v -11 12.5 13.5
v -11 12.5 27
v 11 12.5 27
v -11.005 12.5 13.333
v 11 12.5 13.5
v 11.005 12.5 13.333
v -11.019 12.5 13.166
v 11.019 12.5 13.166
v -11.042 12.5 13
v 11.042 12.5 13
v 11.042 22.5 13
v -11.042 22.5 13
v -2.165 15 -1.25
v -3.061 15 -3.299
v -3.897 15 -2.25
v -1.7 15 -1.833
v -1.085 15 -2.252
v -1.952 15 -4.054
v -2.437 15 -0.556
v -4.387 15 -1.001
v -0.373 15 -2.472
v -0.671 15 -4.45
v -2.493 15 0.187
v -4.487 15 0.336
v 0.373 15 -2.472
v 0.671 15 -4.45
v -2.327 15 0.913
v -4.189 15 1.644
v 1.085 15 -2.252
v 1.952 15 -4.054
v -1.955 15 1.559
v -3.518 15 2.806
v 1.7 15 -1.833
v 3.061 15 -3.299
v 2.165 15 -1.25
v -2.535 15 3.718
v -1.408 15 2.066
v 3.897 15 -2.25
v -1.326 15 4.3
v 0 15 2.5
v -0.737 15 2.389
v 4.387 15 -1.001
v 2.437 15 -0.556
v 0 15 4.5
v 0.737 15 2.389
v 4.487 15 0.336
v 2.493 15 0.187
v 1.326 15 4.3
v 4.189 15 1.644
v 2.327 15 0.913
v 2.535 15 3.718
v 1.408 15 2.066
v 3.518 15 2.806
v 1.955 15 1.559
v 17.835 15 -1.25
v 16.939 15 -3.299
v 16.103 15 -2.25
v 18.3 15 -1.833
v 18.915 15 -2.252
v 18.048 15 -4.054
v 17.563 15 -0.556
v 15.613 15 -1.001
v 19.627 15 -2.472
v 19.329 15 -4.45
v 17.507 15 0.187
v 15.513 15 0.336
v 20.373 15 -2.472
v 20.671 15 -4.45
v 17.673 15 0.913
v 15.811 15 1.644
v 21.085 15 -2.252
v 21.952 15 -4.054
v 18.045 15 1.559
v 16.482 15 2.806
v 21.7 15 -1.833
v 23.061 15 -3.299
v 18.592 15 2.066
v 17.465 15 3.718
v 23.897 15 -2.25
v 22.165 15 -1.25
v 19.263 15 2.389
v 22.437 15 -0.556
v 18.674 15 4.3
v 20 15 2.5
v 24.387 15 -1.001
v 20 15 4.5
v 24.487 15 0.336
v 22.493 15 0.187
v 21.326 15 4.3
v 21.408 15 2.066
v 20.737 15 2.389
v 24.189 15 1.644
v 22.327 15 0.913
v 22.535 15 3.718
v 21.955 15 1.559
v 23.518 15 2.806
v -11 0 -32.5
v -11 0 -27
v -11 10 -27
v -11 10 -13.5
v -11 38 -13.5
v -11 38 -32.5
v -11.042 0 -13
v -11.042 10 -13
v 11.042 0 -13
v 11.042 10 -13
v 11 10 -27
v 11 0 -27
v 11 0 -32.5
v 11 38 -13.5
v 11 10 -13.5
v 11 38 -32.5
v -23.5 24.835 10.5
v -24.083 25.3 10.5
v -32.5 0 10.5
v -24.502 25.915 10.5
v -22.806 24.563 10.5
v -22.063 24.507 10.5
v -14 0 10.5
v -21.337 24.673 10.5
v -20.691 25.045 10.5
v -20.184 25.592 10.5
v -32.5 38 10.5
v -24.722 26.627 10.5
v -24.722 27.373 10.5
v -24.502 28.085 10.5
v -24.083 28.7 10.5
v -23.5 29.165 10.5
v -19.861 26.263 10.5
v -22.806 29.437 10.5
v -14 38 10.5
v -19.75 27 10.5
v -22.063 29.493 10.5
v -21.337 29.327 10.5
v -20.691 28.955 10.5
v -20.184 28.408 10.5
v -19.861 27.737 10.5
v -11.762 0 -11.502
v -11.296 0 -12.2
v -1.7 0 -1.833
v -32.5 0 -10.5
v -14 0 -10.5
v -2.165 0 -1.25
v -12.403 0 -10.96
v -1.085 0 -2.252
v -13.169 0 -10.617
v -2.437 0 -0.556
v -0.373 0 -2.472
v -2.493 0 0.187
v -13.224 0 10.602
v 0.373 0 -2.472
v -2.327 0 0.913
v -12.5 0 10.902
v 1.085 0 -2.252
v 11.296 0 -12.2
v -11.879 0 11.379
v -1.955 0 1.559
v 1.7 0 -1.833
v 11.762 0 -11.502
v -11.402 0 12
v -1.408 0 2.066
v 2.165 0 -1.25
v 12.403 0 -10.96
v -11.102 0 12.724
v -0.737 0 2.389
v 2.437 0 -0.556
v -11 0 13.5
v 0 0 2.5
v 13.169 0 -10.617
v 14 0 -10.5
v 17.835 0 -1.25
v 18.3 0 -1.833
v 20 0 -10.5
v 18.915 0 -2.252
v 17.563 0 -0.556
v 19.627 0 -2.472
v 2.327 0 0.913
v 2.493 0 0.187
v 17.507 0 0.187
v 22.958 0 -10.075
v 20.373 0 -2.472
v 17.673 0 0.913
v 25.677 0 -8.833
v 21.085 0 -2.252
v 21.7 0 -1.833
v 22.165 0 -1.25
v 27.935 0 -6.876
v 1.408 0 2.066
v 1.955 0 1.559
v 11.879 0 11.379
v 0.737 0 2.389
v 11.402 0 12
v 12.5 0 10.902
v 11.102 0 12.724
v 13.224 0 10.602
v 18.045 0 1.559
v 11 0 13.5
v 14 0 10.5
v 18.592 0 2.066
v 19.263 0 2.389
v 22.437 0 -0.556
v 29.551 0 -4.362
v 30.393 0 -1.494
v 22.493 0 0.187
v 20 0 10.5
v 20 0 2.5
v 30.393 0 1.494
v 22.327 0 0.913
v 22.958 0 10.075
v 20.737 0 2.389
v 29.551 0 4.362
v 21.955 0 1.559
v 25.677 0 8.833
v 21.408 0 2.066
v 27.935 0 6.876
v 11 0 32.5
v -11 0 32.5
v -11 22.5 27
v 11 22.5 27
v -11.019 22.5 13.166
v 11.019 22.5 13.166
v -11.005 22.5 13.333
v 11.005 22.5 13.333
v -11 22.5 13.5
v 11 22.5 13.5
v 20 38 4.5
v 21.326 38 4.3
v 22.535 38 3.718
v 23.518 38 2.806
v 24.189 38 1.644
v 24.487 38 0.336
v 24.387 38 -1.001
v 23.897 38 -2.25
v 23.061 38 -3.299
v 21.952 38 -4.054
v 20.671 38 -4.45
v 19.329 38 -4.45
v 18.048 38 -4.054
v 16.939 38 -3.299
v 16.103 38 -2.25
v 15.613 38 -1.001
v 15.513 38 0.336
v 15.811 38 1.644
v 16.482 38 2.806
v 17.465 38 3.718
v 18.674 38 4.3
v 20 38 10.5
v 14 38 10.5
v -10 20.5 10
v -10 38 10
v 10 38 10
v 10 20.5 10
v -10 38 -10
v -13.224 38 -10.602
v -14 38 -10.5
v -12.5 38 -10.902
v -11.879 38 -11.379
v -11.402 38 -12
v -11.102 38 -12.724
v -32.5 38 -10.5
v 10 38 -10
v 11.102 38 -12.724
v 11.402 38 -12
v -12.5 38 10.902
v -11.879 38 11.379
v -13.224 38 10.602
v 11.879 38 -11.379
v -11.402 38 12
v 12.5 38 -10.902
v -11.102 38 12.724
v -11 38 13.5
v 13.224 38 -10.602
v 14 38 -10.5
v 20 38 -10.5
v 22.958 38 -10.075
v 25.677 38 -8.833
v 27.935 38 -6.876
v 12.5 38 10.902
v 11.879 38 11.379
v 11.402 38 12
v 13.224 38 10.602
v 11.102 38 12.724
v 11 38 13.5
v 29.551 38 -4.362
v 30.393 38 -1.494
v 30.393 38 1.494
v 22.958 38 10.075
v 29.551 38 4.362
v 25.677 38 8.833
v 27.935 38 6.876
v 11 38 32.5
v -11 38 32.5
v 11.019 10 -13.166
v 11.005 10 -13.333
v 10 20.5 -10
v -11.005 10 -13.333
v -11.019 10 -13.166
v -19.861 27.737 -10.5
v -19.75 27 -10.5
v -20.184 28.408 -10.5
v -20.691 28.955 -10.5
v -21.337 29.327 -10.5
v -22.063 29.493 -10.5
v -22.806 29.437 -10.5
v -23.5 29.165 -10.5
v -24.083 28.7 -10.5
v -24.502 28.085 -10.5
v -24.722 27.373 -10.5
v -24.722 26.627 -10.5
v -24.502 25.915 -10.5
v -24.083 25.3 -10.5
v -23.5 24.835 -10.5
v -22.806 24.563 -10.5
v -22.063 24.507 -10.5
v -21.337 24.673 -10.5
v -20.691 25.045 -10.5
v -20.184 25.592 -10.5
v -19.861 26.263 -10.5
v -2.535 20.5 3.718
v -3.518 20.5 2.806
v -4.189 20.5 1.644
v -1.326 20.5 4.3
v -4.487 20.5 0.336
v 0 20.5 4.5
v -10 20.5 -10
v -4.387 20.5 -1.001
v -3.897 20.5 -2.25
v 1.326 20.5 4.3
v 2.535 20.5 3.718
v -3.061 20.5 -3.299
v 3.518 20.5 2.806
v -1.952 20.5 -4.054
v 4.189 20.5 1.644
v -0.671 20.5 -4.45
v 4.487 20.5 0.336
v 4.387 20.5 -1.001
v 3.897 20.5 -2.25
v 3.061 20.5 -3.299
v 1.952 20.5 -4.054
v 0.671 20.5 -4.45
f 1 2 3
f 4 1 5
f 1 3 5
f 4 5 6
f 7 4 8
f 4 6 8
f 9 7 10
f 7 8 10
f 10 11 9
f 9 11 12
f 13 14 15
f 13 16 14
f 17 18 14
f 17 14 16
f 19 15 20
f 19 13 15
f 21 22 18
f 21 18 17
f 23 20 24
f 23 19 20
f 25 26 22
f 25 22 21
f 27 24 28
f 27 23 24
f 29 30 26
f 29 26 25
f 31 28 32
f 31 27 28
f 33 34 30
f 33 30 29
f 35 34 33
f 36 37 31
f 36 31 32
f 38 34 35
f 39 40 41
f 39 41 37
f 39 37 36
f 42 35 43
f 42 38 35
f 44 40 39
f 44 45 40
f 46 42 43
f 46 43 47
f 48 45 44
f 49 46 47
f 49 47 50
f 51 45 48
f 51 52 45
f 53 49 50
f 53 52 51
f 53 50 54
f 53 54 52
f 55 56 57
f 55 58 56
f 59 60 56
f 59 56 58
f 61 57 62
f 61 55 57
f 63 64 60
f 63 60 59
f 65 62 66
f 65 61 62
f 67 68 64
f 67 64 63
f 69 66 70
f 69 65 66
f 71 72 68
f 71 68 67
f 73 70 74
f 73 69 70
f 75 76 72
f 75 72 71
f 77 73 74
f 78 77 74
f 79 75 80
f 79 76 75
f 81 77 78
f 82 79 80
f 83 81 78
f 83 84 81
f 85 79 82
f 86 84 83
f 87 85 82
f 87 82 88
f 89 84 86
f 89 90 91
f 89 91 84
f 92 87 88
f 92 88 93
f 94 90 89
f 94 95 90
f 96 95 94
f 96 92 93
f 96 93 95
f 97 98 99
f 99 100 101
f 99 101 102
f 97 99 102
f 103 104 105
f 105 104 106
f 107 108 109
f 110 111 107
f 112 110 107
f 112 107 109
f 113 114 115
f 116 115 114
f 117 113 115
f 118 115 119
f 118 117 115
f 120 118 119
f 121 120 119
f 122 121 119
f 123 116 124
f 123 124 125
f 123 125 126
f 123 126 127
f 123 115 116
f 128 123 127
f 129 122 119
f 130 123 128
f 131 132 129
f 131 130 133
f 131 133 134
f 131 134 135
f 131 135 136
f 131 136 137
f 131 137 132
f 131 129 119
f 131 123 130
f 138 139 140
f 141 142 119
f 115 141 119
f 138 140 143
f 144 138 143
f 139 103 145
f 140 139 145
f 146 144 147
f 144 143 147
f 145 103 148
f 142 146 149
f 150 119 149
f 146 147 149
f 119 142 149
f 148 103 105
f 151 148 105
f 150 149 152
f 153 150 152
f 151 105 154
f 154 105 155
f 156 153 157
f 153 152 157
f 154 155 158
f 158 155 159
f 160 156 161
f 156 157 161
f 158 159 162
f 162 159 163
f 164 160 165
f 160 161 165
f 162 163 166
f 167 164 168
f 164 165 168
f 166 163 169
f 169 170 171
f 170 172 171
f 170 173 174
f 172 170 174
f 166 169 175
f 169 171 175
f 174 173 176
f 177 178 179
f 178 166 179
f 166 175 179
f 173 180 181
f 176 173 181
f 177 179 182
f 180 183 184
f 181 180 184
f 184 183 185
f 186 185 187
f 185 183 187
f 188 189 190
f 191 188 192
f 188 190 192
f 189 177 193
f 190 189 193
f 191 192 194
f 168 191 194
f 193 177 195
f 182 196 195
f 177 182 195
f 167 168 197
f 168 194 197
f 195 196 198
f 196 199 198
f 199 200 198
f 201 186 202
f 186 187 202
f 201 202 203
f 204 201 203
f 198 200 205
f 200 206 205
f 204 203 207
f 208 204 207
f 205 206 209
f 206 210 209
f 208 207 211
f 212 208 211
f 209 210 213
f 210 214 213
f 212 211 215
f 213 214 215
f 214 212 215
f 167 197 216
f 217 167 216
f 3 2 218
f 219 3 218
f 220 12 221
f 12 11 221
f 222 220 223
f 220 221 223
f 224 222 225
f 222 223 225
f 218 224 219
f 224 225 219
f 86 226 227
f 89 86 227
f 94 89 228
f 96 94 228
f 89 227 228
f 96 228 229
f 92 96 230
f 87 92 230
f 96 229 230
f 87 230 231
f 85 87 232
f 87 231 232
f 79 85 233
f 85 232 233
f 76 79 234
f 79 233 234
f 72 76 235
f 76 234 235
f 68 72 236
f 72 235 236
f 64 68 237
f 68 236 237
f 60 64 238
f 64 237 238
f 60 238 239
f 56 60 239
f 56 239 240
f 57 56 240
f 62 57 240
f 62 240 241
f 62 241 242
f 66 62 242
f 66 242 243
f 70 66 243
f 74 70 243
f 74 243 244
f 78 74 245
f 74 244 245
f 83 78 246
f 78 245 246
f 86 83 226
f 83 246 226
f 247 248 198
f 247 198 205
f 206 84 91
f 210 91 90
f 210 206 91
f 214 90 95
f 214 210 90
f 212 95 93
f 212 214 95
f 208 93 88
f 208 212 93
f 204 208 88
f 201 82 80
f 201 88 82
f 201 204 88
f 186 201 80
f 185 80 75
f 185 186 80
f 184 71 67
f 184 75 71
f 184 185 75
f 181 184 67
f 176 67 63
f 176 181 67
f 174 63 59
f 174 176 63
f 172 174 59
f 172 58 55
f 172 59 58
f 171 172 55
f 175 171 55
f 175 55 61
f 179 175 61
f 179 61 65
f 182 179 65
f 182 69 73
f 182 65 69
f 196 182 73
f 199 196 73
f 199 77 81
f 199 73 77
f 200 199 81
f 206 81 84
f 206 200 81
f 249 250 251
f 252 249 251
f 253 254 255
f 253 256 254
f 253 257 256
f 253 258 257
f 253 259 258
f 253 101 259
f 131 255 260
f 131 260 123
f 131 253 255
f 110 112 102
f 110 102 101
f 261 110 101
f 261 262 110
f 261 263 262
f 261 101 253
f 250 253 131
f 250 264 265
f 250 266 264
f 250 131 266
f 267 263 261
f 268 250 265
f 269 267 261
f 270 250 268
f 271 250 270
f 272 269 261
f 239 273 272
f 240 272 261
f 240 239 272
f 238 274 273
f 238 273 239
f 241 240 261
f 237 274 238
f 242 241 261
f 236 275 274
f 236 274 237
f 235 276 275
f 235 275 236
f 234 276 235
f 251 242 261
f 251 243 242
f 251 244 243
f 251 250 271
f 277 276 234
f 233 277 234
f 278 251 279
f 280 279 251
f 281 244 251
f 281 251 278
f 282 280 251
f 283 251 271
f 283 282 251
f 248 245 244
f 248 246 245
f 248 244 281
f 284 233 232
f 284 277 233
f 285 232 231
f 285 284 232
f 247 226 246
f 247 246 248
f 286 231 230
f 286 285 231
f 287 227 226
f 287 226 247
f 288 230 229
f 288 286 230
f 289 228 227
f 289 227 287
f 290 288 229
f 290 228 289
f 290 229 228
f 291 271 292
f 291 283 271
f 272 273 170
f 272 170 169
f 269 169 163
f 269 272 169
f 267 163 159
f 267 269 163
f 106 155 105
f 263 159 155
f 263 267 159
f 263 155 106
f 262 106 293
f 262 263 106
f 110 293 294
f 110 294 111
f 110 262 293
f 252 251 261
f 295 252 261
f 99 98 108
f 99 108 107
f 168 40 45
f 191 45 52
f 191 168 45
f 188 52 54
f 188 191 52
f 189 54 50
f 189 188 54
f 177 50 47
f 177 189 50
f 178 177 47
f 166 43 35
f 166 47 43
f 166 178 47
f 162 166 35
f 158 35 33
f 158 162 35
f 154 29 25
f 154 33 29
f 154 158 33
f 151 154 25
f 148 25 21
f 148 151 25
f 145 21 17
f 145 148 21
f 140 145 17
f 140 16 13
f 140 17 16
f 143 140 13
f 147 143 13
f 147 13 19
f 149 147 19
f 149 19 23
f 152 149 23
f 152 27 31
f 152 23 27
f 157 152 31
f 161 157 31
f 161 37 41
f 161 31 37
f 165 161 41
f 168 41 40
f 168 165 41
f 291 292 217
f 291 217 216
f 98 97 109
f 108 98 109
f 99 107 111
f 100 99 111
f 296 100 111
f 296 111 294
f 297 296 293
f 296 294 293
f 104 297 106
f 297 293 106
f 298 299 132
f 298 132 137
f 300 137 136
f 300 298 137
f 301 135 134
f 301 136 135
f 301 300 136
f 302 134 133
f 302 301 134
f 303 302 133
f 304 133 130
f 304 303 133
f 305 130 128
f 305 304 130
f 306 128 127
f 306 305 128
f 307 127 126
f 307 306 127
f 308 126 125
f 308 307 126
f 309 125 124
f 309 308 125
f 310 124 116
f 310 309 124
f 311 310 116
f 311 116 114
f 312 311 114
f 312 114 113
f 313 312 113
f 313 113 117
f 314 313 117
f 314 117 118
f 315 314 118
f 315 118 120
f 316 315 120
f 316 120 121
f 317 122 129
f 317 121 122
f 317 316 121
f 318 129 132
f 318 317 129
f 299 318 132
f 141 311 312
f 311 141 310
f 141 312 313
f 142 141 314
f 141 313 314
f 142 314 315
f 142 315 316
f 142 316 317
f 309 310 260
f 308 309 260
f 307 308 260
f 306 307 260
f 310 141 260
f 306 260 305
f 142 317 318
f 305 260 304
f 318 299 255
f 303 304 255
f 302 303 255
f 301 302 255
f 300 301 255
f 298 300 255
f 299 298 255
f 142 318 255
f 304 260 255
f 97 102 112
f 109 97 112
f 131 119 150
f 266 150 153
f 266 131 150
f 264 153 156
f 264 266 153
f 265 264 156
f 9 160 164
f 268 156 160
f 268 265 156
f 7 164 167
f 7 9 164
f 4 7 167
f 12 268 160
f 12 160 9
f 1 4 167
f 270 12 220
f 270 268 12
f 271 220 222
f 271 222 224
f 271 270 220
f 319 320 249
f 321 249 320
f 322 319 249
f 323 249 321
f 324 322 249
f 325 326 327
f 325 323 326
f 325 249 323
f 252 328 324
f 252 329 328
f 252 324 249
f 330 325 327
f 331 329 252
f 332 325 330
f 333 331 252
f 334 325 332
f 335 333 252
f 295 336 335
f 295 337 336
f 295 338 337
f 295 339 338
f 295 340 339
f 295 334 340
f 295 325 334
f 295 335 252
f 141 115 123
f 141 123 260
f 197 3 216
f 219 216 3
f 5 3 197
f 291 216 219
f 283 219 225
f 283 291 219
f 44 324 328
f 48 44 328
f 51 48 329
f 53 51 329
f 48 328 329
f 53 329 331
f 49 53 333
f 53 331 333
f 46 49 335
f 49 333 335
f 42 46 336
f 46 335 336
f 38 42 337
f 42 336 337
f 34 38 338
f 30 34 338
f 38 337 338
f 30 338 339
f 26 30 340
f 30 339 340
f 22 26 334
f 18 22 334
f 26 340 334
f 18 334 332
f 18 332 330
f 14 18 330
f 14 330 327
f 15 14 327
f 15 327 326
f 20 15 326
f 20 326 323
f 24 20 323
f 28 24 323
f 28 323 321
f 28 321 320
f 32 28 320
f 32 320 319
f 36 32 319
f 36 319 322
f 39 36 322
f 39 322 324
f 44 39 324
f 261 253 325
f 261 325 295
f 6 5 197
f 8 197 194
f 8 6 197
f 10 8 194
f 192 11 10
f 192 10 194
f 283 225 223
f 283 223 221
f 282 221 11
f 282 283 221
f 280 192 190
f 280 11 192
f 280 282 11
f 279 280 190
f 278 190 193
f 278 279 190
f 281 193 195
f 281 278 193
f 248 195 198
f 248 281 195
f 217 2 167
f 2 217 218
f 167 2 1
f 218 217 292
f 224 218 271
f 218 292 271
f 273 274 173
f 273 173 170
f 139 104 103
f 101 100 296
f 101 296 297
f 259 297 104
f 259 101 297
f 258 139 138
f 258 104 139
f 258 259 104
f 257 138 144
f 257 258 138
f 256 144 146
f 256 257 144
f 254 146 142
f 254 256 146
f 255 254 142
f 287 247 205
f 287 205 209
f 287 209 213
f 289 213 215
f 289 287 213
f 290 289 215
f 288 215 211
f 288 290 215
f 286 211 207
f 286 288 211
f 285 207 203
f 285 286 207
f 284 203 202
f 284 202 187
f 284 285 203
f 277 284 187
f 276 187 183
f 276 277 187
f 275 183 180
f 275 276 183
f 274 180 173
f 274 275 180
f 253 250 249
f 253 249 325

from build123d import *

# Parameters (mm, degrees)
SKETCH1_W               = 65
SKETCH1_H               = 65
SKETCH1_R               = 2.5
BOSS_EXTRUDE1_DEPTH     = 38
SKETCH3_W               = 21.5
SKETCH3_H               = 22
CUT_EXTRUDE2_DEPTH      = 60.636398282
CUT_EXTRUDE3_DEPTH      = 60.636398282
CUT_EXTRUDE3_DEPTH_BACK = 60.636398282
SKETCH4_R               = 2.5
CUT_EXTRUDE4_DEPTH      = 60.636398282
CUT_EXTRUDE4_DEPTH_BACK = 60.636398282
SKETCH6_W               = 14
SKETCH6_H               = 10
SKETCH7_W               = 20
SKETCH7_H               = 20
CUT_EXTRUDE5_DEPTH      = 17.5
FILLET1_R               = 3
SKETCH8_R               = 4.5
CUT_EXTRUDE6_DEPTH      = 23


with BuildPart() as part:
    # Sketch1 → Boss-Extrude1 (new body)
    with BuildSketch(Plane(origin=(0, 0, 0), x_dir=(1, 0, 0), z_dir=(0, 1, 0))):
        Rectangle(SKETCH1_W, SKETCH1_H)
        with Locations(Location((0, 0, 0), (0, 0, 270))):
            Circle(SKETCH1_R, mode=Mode.SUBTRACT)
        with Locations(Location((20, 0, 0), (0, 0, 270))):
            Circle(SKETCH1_R, mode=Mode.SUBTRACT)
    extrude(amount=BOSS_EXTRUDE1_DEPTH)

    # Sketch3 → Cut-Extrude2 (cut, through all)
    with BuildSketch(Plane(origin=(0, 38, 0), x_dir=(1, 0, 0), z_dir=(0, 1, 0))):
        with Locations((-21.75, 21.5)):
            Rectangle(SKETCH3_W, SKETCH3_H)
        with BuildLine():
            Line((11, 32.5), (32.5, 32.5))
            Line((32.5, 32.5), (32.5, -32.5))
            Line((32.5, -32.5), (11, -32.5))
            Line((11, -32.5), (11, -10.5))
            Line((11, -10.5), (20, -10.5))
            ThreePointArc((20, -10.5), (30.5, 0), (20, 10.5))
            Line((20, 10.5), (11, 10.5))
            Line((11, 10.5), (11, 32.5))
        make_face()
        with Locations((-21.75, -21.5)):
            Rectangle(SKETCH3_W, SKETCH3_H)
    extrude(amount=-CUT_EXTRUDE2_DEPTH, mode=Mode.SUBTRACT)

    # Sketch4 → Cut-Extrude3 (cut, two sides: drawn at the far end of the back side and taken through both)
    with BuildSketch(Plane.XY.offset(-CUT_EXTRUDE3_DEPTH_BACK)):
        with Locations((-22.25, 27)):
            Circle(SKETCH4_R)
    extrude(amount=CUT_EXTRUDE3_DEPTH + CUT_EXTRUDE3_DEPTH_BACK, mode=Mode.SUBTRACT)

    # Sketch6 → Cut-Extrude4 (cut, two sides: drawn at the far end of the back side and taken through both)
    with BuildSketch(Plane(origin=(0, 0, 0), x_dir=(0, 0, -1), z_dir=(1, 0, 0)).offset(-CUT_EXTRUDE4_DEPTH_BACK)):
        with Locations((-20, 17.5)):
            Rectangle(SKETCH6_W, SKETCH6_H)
        with Locations((20, 5)):
            Rectangle(SKETCH6_W, SKETCH6_H)
    extrude(amount=CUT_EXTRUDE4_DEPTH + CUT_EXTRUDE4_DEPTH_BACK, mode=Mode.SUBTRACT)

    # Sketch7 → Cut-Extrude5 (cut)
    with BuildSketch(Plane(origin=(0, 38, 0), x_dir=(1, 0, 0), z_dir=(0, 1, 0))):
        Rectangle(SKETCH7_W, SKETCH7_H)
    extrude(amount=-CUT_EXTRUDE5_DEPTH, mode=Mode.SUBTRACT)

    # Fillet1
    # the kernel refuses this fillet: 3 mm, written as the material it adds along each edge
    with BuildSketch(Plane(origin=(11, 38, -10.5), x_dir=(0, 0, -1), z_dir=(0, -1, 0))) as fillet1_piece_1_section:
        with BuildLine():
            CenterArc((FILLET1_R, FILLET1_R), FILLET1_R, 180, 90)
            Line((0, FILLET1_R), (0, 0))
            Line((0, 0), (FILLET1_R, 0))
        make_face()
    fillet1_piece_1 = extrude(amount=38, mode=Mode.PRIVATE)
    fillet1_piece_1 = split(fillet1_piece_1, bisect_by=Plane(origin=(10.978029732, 10, -13.226390424), z_dir=(0, 1, 0)), keep=Keep.TOP, mode=Mode.PRIVATE)
    fillet1_piece_1 = split(fillet1_piece_1, bisect_by=Plane(origin=(10.978029732, 24, -13), z_dir=(0, 0, -1)), keep=Keep.TOP, mode=Mode.PRIVATE)
    add(fillet1_piece_1)
    with BuildSketch(Plane(origin=(11, 38, -10.5), x_dir=(0, 0, -1), z_dir=(0, -1, 0))) as fillet1_piece_2_section:
        with BuildLine():
            CenterArc((FILLET1_R, FILLET1_R), FILLET1_R, 180, 90)
            Line((0, FILLET1_R), (0, 0))
            Line((0, 0), (FILLET1_R, 0))
        make_face()
    fillet1_piece_2 = extrude(amount=38, mode=Mode.PRIVATE)
    fillet1_piece_2 = split(fillet1_piece_2, bisect_by=Plane(origin=(11.690666213, 10, -11.145663974), z_dir=(0, 1, 0)), keep=Keep.TOP, mode=Mode.PRIVATE)
    fillet1_piece_2 = split(fillet1_piece_2, bisect_by=Plane(origin=(11.690666213, 24, -13), z_dir=(0, 0, 1)), keep=Keep.TOP, mode=Mode.PRIVATE)
    add(fillet1_piece_2)
    with BuildSketch(Plane(origin=(11, 38, -10.5), x_dir=(0, 0, -1), z_dir=(0, -1, 0))) as fillet1_piece_3_section:
        with BuildLine():
            CenterArc((FILLET1_R, FILLET1_R), FILLET1_R, 180, 90)
            Line((0, FILLET1_R), (0, 0))
            Line((0, 0), (FILLET1_R, 0))
        make_face()
    fillet1_piece_3 = extrude(amount=38, mode=Mode.PRIVATE)
    fillet1_piece_3 = split(fillet1_piece_3, bisect_by=Plane(origin=(11.690666213, 10, -11.145663974), z_dir=(0, -1, 0)), keep=Keep.TOP, mode=Mode.PRIVATE)
    fillet1_piece_3 = split(fillet1_piece_3, bisect_by=Plane(origin=(11.690666213, 5, -13), z_dir=(0, 0, 1)), keep=Keep.TOP, mode=Mode.PRIVATE)
    add(fillet1_piece_3)
    with BuildSketch(Plane(origin=(11, 38, 10.5), x_dir=(1, 0, 0), z_dir=(0, -1, 0))) as fillet1_piece_4_section:
        with BuildLine():
            CenterArc((FILLET1_R, FILLET1_R), FILLET1_R, 180, 90)
            Line((0, FILLET1_R), (0, 0))
            Line((0, 0), (FILLET1_R, 0))
        make_face()
    fillet1_piece_4 = extrude(amount=38, mode=Mode.PRIVATE)
    fillet1_piece_4 = split(fillet1_piece_4, bisect_by=Plane(origin=(11.690666213, 22.5, 11.145663974), z_dir=(0, 1, 0)), keep=Keep.TOP, mode=Mode.PRIVATE)
    fillet1_piece_4 = split(fillet1_piece_4, bisect_by=Plane(origin=(11.690666213, 30.25, 13), z_dir=(0, 0, -1)), keep=Keep.TOP, mode=Mode.PRIVATE)
    add(fillet1_piece_4)
    with BuildSketch(Plane(origin=(11, 38, 10.5), x_dir=(1, 0, 0), z_dir=(0, -1, 0))) as fillet1_piece_5_section:
        with BuildLine():
            CenterArc((FILLET1_R, FILLET1_R), FILLET1_R, 180, 90)
            Line((0, FILLET1_R), (0, 0))
            Line((0, 0), (FILLET1_R, 0))
        make_face()
    fillet1_piece_5 = extrude(amount=38, mode=Mode.PRIVATE)
    fillet1_piece_5 = split(fillet1_piece_5, bisect_by=Plane(origin=(10.978029732, 22.5, 13.226390424), z_dir=(0, 1, 0)), keep=Keep.TOP, mode=Mode.PRIVATE)
    fillet1_piece_5 = split(fillet1_piece_5, bisect_by=Plane(origin=(10.978029732, 30.25, 13), z_dir=(0, 0, 1)), keep=Keep.TOP, mode=Mode.PRIVATE)
    add(fillet1_piece_5)
    with BuildSketch(Plane(origin=(11, 38, 10.5), x_dir=(1, 0, 0), z_dir=(0, -1, 0))) as fillet1_piece_6_section:
        with BuildLine():
            CenterArc((FILLET1_R, FILLET1_R), FILLET1_R, 180, 90)
            Line((0, FILLET1_R), (0, 0))
            Line((0, 0), (FILLET1_R, 0))
        make_face()
    fillet1_piece_6 = extrude(amount=38, mode=Mode.PRIVATE)
    fillet1_piece_6 = split(fillet1_piece_6, bisect_by=Plane(origin=(11.690666213, 22.5, 11.145663974), z_dir=(0, -1, 0)), keep=Keep.TOP, mode=Mode.PRIVATE)
    fillet1_piece_6 = split(fillet1_piece_6, bisect_by=Plane(origin=(11.690666213, 12.5, 11.145663974), z_dir=(0, 1, 0)), keep=Keep.TOP, mode=Mode.PRIVATE)
    fillet1_piece_6 = split(fillet1_piece_6, bisect_by=Plane(origin=(11.690666213, 17.5, 13), z_dir=(0, 0, -1)), keep=Keep.TOP, mode=Mode.PRIVATE)
    add(fillet1_piece_6)
    with BuildSketch(Plane(origin=(11, 38, 10.5), x_dir=(1, 0, 0), z_dir=(0, -1, 0))) as fillet1_piece_7_section:
        with BuildLine():
            CenterArc((FILLET1_R, FILLET1_R), FILLET1_R, 180, 90)
            Line((0, FILLET1_R), (0, 0))
            Line((0, 0), (FILLET1_R, 0))
        make_face()
    fillet1_piece_7 = extrude(amount=38, mode=Mode.PRIVATE)
    fillet1_piece_7 = split(fillet1_piece_7, bisect_by=Plane(origin=(11.690666213, 12.5, 11.145663974), z_dir=(0, -1, 0)), keep=Keep.TOP, mode=Mode.PRIVATE)
    fillet1_piece_7 = split(fillet1_piece_7, bisect_by=Plane(origin=(11.690666213, 6.25, 13), z_dir=(0, 0, -1)), keep=Keep.TOP, mode=Mode.PRIVATE)
    add(fillet1_piece_7)
    with BuildSketch(Plane(origin=(11, 38, 10.5), x_dir=(1, 0, 0), z_dir=(0, -1, 0))) as fillet1_piece_8_section:
        with BuildLine():
            CenterArc((FILLET1_R, FILLET1_R), FILLET1_R, 180, 90)
            Line((0, FILLET1_R), (0, 0))
            Line((0, 0), (FILLET1_R, 0))
        make_face()
    fillet1_piece_8 = extrude(amount=38, mode=Mode.PRIVATE)
    fillet1_piece_8 = split(fillet1_piece_8, bisect_by=Plane(origin=(10.978029732, 12.5, 13.226390424), z_dir=(0, -1, 0)), keep=Keep.TOP, mode=Mode.PRIVATE)
    fillet1_piece_8 = split(fillet1_piece_8, bisect_by=Plane(origin=(10.978029732, 6.25, 13), z_dir=(0, 0, 1)), keep=Keep.TOP, mode=Mode.PRIVATE)
    add(fillet1_piece_8)
    with BuildSketch(Plane(origin=(-11, 38, 10.5), x_dir=(-1, 0, 0), z_dir=(0, -1, 0))) as fillet1_piece_9_section:
        with BuildLine():
            CenterArc((FILLET1_R, -FILLET1_R), FILLET1_R, 90, 90)
            Line((0, -FILLET1_R), (0, 0))
            Line((0, 0), (FILLET1_R, 0))
        make_face()
    fillet1_piece_9 = extrude(amount=38, mode=Mode.PRIVATE)
    fillet1_piece_9 = split(fillet1_piece_9, bisect_by=Plane(origin=(-11.690666213, 22.5, 11.145663974), z_dir=(0, 1, 0)), keep=Keep.TOP, mode=Mode.PRIVATE)
    fillet1_piece_9 = split(fillet1_piece_9, bisect_by=Plane(origin=(-11.690666213, 30.25, 13), z_dir=(0, 0, -1)), keep=Keep.TOP, mode=Mode.PRIVATE)
    add(fillet1_piece_9)
    with BuildSketch(Plane(origin=(-11, 38, 10.5), x_dir=(-1, 0, 0), z_dir=(0, -1, 0))) as fillet1_piece_10_section:
        with BuildLine():
            CenterArc((FILLET1_R, -FILLET1_R), FILLET1_R, 90, 90)
            Line((0, -FILLET1_R), (0, 0))
            Line((0, 0), (FILLET1_R, 0))
        make_face()
    fillet1_piece_10 = extrude(amount=38, mode=Mode.PRIVATE)
    fillet1_piece_10 = split(fillet1_piece_10, bisect_by=Plane(origin=(-10.978029732, 22.5, 13.226390424), z_dir=(0, 1, 0)), keep=Keep.TOP, mode=Mode.PRIVATE)
    fillet1_piece_10 = split(fillet1_piece_10, bisect_by=Plane(origin=(-10.978029732, 30.25, 13), z_dir=(0, 0, 1)), keep=Keep.TOP, mode=Mode.PRIVATE)
    add(fillet1_piece_10)
    with BuildSketch(Plane(origin=(-11, 38, 10.5), x_dir=(-1, 0, 0), z_dir=(0, -1, 0))) as fillet1_piece_11_section:
        with BuildLine():
            CenterArc((FILLET1_R, -FILLET1_R), FILLET1_R, 90, 90)
            Line((0, -FILLET1_R), (0, 0))
            Line((0, 0), (FILLET1_R, 0))
        make_face()
    fillet1_piece_11 = extrude(amount=38, mode=Mode.PRIVATE)
    fillet1_piece_11 = split(fillet1_piece_11, bisect_by=Plane(origin=(-11.690666213, 22.5, 11.145663974), z_dir=(0, -1, 0)), keep=Keep.TOP, mode=Mode.PRIVATE)
    fillet1_piece_11 = split(fillet1_piece_11, bisect_by=Plane(origin=(-11.690666213, 17.5, 13), z_dir=(0, 0, -1)), keep=Keep.TOP, mode=Mode.PRIVATE)
    fillet1_piece_11 = split(fillet1_piece_11, bisect_by=Plane(origin=(-11.690666213, 12.5, 11.145663974), z_dir=(0, 1, 0)), keep=Keep.TOP, mode=Mode.PRIVATE)
    add(fillet1_piece_11)
    with BuildSketch(Plane(origin=(-11, 38, 10.5), x_dir=(-1, 0, 0), z_dir=(0, -1, 0))) as fillet1_piece_12_section:
        with BuildLine():
            CenterArc((FILLET1_R, -FILLET1_R), FILLET1_R, 90, 90)
            Line((0, -FILLET1_R), (0, 0))
            Line((0, 0), (FILLET1_R, 0))
        make_face()
    fillet1_piece_12 = extrude(amount=38, mode=Mode.PRIVATE)
    fillet1_piece_12 = split(fillet1_piece_12, bisect_by=Plane(origin=(-11.690666213, 6.25, 13), z_dir=(0, 0, -1)), keep=Keep.TOP, mode=Mode.PRIVATE)
    fillet1_piece_12 = split(fillet1_piece_12, bisect_by=Plane(origin=(-11.690666213, 12.5, 11.145663974), z_dir=(0, -1, 0)), keep=Keep.TOP, mode=Mode.PRIVATE)
    add(fillet1_piece_12)
    with BuildSketch(Plane(origin=(-11, 38, 10.5), x_dir=(-1, 0, 0), z_dir=(0, -1, 0))) as fillet1_piece_13_section:
        with BuildLine():
            CenterArc((FILLET1_R, -FILLET1_R), FILLET1_R, 90, 90)
            Line((0, -FILLET1_R), (0, 0))
            Line((0, 0), (FILLET1_R, 0))
        make_face()
    fillet1_piece_13 = extrude(amount=38, mode=Mode.PRIVATE)
    fillet1_piece_13 = split(fillet1_piece_13, bisect_by=Plane(origin=(-10.978029732, 6.25, 13), z_dir=(0, 0, 1)), keep=Keep.TOP, mode=Mode.PRIVATE)
    fillet1_piece_13 = split(fillet1_piece_13, bisect_by=Plane(origin=(-10.978029732, 12.5, 13.226390424), z_dir=(0, -1, 0)), keep=Keep.TOP, mode=Mode.PRIVATE)
    add(fillet1_piece_13)
    with BuildSketch(Plane(origin=(-11, 38, -10.5), x_dir=(0, 0, -1), z_dir=(0, -1, 0))) as fillet1_piece_14_section:
        with BuildLine():
            CenterArc((FILLET1_R, -FILLET1_R), FILLET1_R, 90, 90)
            Line((0, -FILLET1_R), (0, 0))
            Line((0, 0), (FILLET1_R, 0))
        make_face()
    fillet1_piece_14 = extrude(amount=38, mode=Mode.PRIVATE)
    fillet1_piece_14 = split(fillet1_piece_14, bisect_by=Plane(origin=(-10.978029732, 10, -13.226390424), z_dir=(0, 1, 0)), keep=Keep.TOP, mode=Mode.PRIVATE)
    fillet1_piece_14 = split(fillet1_piece_14, bisect_by=Plane(origin=(-10.978029732, 24, -13), z_dir=(0, 0, -1)), keep=Keep.TOP, mode=Mode.PRIVATE)
    add(fillet1_piece_14)
    with BuildSketch(Plane(origin=(-11, 38, -10.5), x_dir=(0, 0, -1), z_dir=(0, -1, 0))) as fillet1_piece_15_section:
        with BuildLine():
            CenterArc((FILLET1_R, -FILLET1_R), FILLET1_R, 90, 90)
            Line((0, -FILLET1_R), (0, 0))
            Line((0, 0), (FILLET1_R, 0))
        make_face()
    fillet1_piece_15 = extrude(amount=38, mode=Mode.PRIVATE)
    fillet1_piece_15 = split(fillet1_piece_15, bisect_by=Plane(origin=(-11.690666213, 10, -11.145663974), z_dir=(0, 1, 0)), keep=Keep.TOP, mode=Mode.PRIVATE)
    fillet1_piece_15 = split(fillet1_piece_15, bisect_by=Plane(origin=(-11.690666213, 24, -13), z_dir=(0, 0, 1)), keep=Keep.TOP, mode=Mode.PRIVATE)
    add(fillet1_piece_15)
    with BuildSketch(Plane(origin=(-11, 38, -10.5), x_dir=(0, 0, -1), z_dir=(0, -1, 0))) as fillet1_piece_16_section:
        with BuildLine():
            CenterArc((FILLET1_R, -FILLET1_R), FILLET1_R, 90, 90)
            Line((0, -FILLET1_R), (0, 0))
            Line((0, 0), (FILLET1_R, 0))
        make_face()
    fillet1_piece_16 = extrude(amount=38, mode=Mode.PRIVATE)
    fillet1_piece_16 = split(fillet1_piece_16, bisect_by=Plane(origin=(-11.690666213, 10, -11.145663974), z_dir=(0, -1, 0)), keep=Keep.TOP, mode=Mode.PRIVATE)
    fillet1_piece_16 = split(fillet1_piece_16, bisect_by=Plane(origin=(-11.690666213, 5, -13), z_dir=(0, 0, 1)), keep=Keep.TOP, mode=Mode.PRIVATE)
    add(fillet1_piece_16)

    # Sketch8 → Cut-Extrude6 (cut)
    with BuildSketch(Plane(origin=(0, 38, 0), x_dir=(1, 0, 0), z_dir=(0, 1, 0))):
        with Locations(Location((20, 0, 0), (0, 0, 270))):
            Circle(SKETCH8_R)
        with Locations(Location((0, 0, 0), (0, 0, 270))):
            Circle(SKETCH8_R)
    extrude(amount=-CUT_EXTRUDE6_DEPTH, mode=Mode.SUBTRACT)


solid = part.part
